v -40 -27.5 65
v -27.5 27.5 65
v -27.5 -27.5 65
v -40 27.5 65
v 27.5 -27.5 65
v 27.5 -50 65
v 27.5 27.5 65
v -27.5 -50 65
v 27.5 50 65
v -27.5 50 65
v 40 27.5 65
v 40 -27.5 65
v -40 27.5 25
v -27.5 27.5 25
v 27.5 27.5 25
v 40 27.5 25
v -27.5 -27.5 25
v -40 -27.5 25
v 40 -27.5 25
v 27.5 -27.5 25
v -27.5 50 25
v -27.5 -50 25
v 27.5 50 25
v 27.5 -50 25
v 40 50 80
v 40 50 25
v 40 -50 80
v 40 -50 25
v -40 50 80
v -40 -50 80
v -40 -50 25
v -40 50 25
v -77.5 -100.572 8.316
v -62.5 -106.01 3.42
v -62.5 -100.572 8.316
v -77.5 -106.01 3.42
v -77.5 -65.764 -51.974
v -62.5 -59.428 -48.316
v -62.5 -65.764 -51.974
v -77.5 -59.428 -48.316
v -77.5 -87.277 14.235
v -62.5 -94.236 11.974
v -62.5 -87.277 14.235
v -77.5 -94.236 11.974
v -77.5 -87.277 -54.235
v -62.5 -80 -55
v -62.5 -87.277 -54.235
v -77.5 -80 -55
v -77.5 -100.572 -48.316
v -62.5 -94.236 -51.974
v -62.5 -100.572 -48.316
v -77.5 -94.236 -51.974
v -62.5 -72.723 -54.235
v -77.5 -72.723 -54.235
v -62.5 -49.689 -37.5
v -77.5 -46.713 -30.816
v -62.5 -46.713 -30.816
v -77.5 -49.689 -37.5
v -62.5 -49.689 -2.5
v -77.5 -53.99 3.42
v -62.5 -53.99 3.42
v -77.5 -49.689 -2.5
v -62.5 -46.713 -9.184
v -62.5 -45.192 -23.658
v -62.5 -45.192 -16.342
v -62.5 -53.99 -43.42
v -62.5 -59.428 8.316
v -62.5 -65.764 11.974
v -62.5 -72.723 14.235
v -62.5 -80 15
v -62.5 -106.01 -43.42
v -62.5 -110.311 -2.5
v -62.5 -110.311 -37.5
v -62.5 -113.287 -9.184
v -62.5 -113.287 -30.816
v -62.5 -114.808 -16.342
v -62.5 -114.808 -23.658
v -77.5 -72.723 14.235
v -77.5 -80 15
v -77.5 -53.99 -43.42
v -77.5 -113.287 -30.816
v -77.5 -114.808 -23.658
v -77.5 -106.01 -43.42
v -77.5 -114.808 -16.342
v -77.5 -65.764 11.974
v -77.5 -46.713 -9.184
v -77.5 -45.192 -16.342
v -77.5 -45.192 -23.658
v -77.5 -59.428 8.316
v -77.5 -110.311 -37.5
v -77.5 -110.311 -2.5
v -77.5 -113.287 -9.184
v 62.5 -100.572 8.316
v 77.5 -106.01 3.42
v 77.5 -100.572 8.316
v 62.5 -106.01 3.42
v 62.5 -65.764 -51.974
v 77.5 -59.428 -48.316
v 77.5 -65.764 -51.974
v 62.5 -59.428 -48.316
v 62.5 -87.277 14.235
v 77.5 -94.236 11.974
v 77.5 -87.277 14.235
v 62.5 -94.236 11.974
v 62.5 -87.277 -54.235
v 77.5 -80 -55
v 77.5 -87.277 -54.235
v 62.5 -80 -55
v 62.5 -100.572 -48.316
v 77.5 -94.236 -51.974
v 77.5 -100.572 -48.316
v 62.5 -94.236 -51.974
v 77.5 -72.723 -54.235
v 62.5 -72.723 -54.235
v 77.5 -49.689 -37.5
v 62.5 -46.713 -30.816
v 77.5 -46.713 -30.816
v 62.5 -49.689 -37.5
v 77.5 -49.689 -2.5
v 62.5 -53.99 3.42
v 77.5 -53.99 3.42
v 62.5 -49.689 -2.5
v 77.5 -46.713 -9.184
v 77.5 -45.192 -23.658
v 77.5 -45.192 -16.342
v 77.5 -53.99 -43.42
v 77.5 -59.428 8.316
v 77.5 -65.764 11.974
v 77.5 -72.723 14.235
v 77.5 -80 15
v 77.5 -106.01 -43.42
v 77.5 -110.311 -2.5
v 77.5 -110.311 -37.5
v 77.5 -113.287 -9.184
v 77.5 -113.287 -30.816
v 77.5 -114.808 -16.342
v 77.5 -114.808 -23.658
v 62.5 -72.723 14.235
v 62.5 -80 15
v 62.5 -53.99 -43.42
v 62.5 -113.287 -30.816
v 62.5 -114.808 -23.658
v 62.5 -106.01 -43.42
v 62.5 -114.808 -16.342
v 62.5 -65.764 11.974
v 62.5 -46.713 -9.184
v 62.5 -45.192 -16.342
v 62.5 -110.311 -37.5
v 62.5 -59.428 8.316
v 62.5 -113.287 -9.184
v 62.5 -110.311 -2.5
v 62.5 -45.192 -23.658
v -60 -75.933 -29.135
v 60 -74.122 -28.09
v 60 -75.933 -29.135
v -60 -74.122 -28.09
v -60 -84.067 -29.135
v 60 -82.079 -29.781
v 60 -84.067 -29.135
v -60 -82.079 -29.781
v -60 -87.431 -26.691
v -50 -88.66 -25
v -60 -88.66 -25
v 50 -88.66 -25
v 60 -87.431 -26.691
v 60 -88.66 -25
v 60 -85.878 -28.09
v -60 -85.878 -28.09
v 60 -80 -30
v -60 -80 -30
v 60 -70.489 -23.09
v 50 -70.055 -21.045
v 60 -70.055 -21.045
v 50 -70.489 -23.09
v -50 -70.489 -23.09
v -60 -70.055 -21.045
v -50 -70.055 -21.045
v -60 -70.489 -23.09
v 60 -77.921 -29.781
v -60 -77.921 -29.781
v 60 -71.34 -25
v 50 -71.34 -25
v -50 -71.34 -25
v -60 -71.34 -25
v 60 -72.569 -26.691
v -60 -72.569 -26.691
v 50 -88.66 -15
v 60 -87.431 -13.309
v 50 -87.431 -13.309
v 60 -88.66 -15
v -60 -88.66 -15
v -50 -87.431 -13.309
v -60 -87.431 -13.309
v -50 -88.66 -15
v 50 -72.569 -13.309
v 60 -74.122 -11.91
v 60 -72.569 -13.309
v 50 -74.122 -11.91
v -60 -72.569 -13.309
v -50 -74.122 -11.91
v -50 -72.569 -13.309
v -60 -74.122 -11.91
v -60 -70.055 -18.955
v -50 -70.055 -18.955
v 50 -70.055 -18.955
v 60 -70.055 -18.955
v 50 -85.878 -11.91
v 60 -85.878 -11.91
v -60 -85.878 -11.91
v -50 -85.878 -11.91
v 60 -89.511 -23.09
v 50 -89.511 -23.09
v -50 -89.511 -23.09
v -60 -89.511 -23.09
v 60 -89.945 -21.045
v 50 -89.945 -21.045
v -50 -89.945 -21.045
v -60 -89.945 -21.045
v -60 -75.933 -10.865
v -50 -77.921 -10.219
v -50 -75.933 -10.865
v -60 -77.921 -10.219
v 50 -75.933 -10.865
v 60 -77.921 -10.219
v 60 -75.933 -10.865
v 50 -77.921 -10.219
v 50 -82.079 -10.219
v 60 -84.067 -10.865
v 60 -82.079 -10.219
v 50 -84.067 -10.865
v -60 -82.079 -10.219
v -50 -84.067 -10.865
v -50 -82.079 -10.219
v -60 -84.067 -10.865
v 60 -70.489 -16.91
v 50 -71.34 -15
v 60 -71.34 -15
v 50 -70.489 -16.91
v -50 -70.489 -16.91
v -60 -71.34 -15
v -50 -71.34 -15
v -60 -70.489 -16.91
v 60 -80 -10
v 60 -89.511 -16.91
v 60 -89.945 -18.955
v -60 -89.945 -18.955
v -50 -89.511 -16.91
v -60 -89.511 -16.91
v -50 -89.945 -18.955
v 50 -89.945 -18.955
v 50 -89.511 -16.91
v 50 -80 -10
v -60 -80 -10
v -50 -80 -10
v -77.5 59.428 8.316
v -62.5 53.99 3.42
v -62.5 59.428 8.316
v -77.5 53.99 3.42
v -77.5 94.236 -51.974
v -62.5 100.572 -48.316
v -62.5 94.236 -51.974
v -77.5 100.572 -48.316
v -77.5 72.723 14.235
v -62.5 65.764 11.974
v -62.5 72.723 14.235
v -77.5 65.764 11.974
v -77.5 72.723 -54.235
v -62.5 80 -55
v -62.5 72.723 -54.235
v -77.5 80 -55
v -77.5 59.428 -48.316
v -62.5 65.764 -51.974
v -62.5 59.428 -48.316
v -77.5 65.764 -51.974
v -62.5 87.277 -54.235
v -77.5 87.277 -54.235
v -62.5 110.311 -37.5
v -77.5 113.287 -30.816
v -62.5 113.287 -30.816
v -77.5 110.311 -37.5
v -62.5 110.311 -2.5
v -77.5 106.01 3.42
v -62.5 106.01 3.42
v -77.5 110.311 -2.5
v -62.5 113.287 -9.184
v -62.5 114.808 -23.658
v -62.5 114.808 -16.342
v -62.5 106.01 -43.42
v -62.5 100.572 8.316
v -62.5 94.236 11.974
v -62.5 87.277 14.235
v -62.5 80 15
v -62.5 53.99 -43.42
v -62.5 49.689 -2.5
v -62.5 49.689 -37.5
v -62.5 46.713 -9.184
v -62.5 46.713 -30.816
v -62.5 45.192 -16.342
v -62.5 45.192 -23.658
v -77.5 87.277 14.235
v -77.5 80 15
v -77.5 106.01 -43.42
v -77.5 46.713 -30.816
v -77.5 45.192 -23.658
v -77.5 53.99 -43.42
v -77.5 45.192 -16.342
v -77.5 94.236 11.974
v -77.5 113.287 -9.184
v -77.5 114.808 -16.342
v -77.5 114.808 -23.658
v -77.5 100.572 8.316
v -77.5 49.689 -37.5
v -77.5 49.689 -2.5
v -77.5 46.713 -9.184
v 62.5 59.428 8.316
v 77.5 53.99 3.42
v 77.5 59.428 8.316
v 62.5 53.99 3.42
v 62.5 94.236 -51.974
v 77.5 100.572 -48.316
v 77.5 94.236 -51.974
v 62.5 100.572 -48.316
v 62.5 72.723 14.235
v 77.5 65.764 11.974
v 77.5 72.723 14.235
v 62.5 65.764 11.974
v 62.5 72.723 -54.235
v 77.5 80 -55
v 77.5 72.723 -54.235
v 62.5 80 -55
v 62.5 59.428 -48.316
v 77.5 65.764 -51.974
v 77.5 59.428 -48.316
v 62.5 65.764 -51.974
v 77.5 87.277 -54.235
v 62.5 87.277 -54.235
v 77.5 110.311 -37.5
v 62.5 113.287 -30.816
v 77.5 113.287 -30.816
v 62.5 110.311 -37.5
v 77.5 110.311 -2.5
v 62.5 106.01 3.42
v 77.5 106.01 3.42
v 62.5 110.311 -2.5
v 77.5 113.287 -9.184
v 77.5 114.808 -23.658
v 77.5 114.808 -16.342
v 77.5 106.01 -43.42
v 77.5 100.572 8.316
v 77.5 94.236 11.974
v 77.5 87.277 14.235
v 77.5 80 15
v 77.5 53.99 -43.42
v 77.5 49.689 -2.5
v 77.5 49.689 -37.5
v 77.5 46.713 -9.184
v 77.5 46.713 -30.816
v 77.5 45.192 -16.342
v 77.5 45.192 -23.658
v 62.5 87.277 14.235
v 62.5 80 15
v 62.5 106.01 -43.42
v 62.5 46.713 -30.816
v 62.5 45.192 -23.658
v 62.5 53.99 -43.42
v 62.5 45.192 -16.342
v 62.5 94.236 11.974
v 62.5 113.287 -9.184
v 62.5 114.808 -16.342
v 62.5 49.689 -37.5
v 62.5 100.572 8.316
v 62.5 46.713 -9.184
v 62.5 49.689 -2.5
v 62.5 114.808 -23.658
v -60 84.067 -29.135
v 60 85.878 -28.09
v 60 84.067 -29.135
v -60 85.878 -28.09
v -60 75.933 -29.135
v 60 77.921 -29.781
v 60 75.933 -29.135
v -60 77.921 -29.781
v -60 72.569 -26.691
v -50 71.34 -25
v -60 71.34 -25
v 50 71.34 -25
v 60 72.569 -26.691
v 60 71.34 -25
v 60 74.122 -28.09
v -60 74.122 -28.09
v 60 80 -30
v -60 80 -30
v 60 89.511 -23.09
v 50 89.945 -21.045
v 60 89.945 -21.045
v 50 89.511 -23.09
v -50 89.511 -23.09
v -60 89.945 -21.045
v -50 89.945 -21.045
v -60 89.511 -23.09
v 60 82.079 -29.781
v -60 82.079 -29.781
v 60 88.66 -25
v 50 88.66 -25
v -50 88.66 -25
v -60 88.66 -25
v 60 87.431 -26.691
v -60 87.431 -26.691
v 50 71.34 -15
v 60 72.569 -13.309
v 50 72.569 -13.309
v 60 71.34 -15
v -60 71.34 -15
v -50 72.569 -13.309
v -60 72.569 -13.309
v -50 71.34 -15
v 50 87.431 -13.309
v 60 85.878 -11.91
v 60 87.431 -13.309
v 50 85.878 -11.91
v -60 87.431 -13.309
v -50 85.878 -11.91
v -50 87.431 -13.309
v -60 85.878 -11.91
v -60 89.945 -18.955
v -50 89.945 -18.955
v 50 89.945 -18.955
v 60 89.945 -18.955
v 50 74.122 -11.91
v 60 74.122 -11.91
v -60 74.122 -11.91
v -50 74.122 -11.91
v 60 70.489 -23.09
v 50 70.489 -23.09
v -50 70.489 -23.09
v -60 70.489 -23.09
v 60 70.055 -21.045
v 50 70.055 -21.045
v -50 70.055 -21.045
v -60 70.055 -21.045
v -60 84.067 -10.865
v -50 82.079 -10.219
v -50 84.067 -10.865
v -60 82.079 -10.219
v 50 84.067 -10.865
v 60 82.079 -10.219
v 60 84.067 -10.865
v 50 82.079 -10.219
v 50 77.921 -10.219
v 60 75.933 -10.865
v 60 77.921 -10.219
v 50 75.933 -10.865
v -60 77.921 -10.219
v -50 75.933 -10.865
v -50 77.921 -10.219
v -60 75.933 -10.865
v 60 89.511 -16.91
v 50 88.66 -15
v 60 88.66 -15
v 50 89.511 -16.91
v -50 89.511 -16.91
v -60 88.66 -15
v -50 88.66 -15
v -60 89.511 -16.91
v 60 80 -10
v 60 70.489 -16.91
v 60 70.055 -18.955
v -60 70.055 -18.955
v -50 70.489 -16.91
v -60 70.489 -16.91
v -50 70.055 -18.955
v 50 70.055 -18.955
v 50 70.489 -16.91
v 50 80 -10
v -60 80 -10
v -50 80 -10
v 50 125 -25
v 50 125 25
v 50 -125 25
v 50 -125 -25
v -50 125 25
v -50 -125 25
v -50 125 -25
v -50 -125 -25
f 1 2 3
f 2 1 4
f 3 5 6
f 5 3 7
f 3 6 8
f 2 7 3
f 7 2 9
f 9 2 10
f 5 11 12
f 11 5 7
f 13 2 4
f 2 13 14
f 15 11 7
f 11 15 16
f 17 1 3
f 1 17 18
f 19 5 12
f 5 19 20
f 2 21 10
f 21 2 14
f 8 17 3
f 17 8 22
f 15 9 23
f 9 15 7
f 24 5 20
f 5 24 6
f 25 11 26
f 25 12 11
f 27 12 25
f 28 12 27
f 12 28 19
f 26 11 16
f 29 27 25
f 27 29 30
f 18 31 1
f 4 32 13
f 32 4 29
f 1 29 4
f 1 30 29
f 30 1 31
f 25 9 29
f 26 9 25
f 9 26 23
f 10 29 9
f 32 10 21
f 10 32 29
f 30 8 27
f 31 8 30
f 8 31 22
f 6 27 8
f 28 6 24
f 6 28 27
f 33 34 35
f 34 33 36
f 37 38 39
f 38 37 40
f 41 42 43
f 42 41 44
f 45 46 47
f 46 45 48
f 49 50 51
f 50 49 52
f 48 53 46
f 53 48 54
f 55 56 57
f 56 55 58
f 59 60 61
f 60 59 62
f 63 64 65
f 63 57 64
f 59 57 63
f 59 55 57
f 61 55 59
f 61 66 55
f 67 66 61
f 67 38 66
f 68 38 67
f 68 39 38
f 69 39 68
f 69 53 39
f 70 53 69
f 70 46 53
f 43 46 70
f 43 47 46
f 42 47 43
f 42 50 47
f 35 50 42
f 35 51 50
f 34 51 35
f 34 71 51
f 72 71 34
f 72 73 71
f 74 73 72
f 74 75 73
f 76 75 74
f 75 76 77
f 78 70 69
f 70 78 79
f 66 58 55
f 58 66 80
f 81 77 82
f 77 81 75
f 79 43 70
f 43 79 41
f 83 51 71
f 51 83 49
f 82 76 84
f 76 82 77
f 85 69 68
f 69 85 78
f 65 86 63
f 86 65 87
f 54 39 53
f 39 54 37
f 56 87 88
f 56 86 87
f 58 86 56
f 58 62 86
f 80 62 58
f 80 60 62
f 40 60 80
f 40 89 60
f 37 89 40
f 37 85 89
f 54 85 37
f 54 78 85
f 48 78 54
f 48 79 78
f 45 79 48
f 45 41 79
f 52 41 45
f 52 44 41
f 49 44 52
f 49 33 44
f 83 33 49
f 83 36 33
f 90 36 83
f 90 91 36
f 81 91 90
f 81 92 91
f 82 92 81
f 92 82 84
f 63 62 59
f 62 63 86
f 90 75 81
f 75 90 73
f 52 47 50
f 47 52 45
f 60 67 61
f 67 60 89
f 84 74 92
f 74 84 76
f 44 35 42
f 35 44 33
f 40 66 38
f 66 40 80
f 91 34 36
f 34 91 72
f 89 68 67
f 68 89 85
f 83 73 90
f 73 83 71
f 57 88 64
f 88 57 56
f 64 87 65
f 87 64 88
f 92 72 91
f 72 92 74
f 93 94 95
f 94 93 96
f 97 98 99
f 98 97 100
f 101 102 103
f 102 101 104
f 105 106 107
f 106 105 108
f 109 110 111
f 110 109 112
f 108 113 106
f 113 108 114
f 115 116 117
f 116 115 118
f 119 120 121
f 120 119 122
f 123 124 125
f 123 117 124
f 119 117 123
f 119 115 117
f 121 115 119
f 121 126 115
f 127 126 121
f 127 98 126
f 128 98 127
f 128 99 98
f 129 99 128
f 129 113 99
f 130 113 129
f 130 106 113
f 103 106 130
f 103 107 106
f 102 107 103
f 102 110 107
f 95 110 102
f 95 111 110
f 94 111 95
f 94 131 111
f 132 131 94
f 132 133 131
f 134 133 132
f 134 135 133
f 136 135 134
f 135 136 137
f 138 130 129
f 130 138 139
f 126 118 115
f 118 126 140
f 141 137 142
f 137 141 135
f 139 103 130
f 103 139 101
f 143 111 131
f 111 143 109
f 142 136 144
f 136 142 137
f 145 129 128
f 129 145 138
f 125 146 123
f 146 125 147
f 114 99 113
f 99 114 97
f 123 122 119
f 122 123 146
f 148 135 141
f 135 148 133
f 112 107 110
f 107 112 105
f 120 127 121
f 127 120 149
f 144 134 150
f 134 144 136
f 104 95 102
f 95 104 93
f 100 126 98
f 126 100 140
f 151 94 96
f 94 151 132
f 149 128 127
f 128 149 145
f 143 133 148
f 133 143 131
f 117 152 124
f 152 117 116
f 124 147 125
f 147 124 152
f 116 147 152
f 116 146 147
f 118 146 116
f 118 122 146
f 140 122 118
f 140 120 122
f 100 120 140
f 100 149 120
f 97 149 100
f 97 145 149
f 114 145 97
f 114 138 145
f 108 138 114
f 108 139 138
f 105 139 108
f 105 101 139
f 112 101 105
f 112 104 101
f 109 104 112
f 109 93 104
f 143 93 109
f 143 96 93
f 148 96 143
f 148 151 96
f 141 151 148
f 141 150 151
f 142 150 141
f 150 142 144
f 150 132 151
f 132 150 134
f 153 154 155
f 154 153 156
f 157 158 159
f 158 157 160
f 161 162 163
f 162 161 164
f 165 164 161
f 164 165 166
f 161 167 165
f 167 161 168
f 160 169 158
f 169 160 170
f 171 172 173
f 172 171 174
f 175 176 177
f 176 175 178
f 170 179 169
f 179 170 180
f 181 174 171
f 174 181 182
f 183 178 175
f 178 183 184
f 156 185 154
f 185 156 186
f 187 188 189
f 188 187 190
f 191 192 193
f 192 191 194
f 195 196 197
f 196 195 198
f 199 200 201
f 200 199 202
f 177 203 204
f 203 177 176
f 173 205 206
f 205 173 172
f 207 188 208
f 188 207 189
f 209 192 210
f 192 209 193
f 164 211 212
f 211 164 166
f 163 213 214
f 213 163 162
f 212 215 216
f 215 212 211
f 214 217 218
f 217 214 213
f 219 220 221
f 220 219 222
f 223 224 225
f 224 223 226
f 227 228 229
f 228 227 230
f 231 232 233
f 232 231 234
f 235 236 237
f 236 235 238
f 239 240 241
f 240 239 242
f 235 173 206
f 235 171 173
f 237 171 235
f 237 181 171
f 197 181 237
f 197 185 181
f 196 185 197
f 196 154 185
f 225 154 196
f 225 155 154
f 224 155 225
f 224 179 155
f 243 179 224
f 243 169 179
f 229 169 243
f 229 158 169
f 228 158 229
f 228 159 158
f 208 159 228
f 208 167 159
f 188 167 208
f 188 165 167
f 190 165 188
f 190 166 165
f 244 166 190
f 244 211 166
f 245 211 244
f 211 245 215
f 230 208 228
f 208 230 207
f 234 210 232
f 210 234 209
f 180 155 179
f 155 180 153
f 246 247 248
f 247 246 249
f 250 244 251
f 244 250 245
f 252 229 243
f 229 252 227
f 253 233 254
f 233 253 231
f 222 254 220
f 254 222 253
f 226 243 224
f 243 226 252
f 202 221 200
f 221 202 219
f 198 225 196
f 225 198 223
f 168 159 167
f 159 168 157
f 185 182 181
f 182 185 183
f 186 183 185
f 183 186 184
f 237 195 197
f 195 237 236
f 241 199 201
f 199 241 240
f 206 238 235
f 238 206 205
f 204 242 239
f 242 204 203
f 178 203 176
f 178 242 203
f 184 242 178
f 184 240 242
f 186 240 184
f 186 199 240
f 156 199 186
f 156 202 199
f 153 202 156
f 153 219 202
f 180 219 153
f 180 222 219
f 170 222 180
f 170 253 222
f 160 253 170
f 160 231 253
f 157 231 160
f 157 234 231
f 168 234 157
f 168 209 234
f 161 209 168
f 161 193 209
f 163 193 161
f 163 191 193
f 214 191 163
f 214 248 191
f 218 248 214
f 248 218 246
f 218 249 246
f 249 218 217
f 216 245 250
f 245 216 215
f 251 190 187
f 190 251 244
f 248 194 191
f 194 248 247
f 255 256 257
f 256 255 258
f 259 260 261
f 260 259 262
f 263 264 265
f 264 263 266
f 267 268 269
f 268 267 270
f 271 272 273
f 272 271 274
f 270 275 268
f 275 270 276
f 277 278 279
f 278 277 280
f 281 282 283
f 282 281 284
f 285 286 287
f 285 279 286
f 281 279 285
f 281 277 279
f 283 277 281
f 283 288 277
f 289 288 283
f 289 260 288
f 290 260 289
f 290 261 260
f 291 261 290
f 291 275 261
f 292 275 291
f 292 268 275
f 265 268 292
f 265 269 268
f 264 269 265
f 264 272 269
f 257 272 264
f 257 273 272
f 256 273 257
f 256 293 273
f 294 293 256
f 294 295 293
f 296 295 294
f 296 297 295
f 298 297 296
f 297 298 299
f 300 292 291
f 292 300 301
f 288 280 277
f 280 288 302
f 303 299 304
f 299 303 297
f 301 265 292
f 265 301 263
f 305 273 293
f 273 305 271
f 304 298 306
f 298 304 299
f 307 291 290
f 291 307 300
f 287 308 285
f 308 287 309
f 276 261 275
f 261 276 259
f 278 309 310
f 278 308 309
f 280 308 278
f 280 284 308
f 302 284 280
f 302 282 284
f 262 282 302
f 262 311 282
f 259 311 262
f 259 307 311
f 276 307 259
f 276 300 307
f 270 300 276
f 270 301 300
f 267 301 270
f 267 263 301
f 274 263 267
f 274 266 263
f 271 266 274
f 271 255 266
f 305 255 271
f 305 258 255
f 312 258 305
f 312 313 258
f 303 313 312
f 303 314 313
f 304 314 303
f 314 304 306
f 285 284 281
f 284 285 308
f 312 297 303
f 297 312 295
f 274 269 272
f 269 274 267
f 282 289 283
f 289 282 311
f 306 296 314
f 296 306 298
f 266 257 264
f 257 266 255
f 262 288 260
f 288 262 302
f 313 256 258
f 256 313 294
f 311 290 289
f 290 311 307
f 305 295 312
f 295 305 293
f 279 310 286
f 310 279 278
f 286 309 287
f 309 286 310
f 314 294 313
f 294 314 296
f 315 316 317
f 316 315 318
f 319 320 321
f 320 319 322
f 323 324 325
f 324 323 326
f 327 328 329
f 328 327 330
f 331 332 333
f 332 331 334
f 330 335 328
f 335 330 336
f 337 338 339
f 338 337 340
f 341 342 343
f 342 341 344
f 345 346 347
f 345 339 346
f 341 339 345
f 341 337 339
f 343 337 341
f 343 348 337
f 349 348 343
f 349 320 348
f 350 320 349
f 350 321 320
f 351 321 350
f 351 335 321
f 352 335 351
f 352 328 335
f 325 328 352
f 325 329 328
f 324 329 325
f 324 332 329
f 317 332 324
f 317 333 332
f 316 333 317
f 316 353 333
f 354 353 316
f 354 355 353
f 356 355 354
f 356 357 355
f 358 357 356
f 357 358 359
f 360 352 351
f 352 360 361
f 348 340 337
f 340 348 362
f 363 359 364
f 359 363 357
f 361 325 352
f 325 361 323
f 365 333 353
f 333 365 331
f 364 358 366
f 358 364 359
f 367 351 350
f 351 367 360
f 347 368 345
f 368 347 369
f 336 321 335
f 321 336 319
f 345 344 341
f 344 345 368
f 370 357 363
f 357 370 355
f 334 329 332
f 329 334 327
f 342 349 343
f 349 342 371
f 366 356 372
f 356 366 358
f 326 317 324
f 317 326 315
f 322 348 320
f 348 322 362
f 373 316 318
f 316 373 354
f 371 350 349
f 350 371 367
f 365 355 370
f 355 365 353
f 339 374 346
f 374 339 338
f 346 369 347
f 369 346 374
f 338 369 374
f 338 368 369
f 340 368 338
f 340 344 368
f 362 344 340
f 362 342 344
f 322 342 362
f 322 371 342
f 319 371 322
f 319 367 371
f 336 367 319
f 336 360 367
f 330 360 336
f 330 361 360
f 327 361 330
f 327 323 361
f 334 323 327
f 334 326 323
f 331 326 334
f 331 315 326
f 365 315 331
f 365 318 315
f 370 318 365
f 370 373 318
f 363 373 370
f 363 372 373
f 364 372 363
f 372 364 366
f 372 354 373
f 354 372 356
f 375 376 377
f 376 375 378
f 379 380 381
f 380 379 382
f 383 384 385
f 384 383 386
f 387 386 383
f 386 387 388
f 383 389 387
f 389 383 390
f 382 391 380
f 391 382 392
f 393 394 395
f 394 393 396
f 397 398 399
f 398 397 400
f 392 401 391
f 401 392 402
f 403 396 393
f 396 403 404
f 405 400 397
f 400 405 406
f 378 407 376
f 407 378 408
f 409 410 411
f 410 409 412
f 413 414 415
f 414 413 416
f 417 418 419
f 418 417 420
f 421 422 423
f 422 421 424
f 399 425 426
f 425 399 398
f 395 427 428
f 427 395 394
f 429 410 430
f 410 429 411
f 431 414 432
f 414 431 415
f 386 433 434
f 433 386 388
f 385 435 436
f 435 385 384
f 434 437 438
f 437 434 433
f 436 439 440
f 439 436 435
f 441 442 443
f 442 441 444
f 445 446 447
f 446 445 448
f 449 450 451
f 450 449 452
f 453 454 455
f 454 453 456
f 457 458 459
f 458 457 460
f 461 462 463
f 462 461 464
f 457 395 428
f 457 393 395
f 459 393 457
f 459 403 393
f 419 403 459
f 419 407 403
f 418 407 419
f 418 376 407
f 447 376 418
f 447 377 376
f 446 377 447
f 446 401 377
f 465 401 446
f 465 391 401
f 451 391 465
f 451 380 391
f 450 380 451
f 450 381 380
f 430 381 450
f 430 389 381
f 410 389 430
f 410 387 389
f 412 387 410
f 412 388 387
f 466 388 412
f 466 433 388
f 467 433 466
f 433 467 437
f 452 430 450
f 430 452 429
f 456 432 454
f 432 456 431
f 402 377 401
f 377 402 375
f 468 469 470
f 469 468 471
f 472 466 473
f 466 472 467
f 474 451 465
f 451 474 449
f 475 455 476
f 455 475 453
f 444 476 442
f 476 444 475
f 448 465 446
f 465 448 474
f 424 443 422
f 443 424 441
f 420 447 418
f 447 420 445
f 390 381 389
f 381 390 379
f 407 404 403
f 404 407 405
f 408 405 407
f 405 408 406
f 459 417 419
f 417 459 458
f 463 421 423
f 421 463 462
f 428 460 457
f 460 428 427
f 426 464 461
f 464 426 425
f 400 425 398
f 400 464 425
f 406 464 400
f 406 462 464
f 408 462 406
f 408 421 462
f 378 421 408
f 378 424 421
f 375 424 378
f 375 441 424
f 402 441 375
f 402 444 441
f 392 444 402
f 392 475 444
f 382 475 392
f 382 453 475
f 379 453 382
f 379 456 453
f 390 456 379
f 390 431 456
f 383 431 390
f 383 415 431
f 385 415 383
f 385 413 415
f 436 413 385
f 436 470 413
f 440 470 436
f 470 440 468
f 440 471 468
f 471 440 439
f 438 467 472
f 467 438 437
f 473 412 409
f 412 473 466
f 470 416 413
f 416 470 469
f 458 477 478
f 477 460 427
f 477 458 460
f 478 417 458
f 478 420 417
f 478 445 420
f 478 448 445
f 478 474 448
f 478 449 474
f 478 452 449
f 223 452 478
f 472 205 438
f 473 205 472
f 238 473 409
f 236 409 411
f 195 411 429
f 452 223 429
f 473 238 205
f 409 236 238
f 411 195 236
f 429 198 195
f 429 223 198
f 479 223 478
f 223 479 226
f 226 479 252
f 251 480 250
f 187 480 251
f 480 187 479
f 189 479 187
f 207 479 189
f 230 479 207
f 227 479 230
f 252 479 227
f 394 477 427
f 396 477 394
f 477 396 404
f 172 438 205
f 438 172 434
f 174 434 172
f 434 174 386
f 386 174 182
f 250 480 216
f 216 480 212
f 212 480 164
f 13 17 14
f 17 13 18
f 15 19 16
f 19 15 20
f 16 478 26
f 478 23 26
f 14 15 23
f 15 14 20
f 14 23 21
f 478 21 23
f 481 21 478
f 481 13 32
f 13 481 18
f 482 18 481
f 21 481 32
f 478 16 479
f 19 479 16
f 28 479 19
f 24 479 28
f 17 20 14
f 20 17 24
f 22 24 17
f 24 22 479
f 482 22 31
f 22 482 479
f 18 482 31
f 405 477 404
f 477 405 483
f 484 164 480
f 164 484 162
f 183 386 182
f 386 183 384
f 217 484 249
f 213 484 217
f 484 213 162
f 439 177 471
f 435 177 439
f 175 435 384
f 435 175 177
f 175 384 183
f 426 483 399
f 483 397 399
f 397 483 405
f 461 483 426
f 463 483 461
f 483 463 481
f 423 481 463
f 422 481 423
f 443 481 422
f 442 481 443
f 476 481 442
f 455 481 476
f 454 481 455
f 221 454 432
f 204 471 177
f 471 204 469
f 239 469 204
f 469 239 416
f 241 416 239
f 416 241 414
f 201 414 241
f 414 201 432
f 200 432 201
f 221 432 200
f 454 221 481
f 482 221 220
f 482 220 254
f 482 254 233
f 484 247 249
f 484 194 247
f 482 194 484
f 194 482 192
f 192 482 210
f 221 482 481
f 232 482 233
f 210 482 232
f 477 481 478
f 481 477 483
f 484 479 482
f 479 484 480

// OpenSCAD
union() {
	cube(center = true, size = [100, 250, 50]);
	translate(v = [0, 0, 50]) {
		difference() {
			cube(center = true, size = [80, 100, 60]);
			union() {
				translate(v = [0, 0, -10]) {
					cube(center = true, size = [200, 55, 50]);
				}
				rotate(a = [0, 0, 90]) {
					translate(v = [0, 0, -10]) {
						cube(center = true, size = [200, 55, 50]);
					}
				}
			}
		}
	}
	translate(v = [0, -80, 0]) {
		translate(v = [0, 0, -20]) {
			union() {
				translate(v = [-70, 0, 0]) {
					rotate(a = [0, 90, 0]) {
						cylinder(center = true, h = 15, r = 35);
					}
				}
				translate(v = [70, 0, 0]) {
					rotate(a = [0, 90, 0]) {
						cylinder(center = true, h = 15, r = 35);
					}
				}
				rotate(a = [0, 90, 0]) {
					cylinder(center = true, h = 120, r = 10);
				}
			}
		}
	}
	translate(v = [0, 160, 0]) {
		translate(v = [0, -80, 0]) {
			translate(v = [0, 0, -20]) {
				union() {
					translate(v = [-70, 0, 0]) {
						rotate(a = [0, 90, 0]) {
							cylinder(center = true, h = 15, r = 35);
						}
					}
					translate(v = [70, 0, 0]) {
						rotate(a = [0, 90, 0]) {
							cylinder(center = true, h = 15, r = 35);
						}
					}
					rotate(a = [0, 90, 0]) {
						cylinder(center = true, h = 120, r = 10);
					}
				}
			}
		}
	}
}
